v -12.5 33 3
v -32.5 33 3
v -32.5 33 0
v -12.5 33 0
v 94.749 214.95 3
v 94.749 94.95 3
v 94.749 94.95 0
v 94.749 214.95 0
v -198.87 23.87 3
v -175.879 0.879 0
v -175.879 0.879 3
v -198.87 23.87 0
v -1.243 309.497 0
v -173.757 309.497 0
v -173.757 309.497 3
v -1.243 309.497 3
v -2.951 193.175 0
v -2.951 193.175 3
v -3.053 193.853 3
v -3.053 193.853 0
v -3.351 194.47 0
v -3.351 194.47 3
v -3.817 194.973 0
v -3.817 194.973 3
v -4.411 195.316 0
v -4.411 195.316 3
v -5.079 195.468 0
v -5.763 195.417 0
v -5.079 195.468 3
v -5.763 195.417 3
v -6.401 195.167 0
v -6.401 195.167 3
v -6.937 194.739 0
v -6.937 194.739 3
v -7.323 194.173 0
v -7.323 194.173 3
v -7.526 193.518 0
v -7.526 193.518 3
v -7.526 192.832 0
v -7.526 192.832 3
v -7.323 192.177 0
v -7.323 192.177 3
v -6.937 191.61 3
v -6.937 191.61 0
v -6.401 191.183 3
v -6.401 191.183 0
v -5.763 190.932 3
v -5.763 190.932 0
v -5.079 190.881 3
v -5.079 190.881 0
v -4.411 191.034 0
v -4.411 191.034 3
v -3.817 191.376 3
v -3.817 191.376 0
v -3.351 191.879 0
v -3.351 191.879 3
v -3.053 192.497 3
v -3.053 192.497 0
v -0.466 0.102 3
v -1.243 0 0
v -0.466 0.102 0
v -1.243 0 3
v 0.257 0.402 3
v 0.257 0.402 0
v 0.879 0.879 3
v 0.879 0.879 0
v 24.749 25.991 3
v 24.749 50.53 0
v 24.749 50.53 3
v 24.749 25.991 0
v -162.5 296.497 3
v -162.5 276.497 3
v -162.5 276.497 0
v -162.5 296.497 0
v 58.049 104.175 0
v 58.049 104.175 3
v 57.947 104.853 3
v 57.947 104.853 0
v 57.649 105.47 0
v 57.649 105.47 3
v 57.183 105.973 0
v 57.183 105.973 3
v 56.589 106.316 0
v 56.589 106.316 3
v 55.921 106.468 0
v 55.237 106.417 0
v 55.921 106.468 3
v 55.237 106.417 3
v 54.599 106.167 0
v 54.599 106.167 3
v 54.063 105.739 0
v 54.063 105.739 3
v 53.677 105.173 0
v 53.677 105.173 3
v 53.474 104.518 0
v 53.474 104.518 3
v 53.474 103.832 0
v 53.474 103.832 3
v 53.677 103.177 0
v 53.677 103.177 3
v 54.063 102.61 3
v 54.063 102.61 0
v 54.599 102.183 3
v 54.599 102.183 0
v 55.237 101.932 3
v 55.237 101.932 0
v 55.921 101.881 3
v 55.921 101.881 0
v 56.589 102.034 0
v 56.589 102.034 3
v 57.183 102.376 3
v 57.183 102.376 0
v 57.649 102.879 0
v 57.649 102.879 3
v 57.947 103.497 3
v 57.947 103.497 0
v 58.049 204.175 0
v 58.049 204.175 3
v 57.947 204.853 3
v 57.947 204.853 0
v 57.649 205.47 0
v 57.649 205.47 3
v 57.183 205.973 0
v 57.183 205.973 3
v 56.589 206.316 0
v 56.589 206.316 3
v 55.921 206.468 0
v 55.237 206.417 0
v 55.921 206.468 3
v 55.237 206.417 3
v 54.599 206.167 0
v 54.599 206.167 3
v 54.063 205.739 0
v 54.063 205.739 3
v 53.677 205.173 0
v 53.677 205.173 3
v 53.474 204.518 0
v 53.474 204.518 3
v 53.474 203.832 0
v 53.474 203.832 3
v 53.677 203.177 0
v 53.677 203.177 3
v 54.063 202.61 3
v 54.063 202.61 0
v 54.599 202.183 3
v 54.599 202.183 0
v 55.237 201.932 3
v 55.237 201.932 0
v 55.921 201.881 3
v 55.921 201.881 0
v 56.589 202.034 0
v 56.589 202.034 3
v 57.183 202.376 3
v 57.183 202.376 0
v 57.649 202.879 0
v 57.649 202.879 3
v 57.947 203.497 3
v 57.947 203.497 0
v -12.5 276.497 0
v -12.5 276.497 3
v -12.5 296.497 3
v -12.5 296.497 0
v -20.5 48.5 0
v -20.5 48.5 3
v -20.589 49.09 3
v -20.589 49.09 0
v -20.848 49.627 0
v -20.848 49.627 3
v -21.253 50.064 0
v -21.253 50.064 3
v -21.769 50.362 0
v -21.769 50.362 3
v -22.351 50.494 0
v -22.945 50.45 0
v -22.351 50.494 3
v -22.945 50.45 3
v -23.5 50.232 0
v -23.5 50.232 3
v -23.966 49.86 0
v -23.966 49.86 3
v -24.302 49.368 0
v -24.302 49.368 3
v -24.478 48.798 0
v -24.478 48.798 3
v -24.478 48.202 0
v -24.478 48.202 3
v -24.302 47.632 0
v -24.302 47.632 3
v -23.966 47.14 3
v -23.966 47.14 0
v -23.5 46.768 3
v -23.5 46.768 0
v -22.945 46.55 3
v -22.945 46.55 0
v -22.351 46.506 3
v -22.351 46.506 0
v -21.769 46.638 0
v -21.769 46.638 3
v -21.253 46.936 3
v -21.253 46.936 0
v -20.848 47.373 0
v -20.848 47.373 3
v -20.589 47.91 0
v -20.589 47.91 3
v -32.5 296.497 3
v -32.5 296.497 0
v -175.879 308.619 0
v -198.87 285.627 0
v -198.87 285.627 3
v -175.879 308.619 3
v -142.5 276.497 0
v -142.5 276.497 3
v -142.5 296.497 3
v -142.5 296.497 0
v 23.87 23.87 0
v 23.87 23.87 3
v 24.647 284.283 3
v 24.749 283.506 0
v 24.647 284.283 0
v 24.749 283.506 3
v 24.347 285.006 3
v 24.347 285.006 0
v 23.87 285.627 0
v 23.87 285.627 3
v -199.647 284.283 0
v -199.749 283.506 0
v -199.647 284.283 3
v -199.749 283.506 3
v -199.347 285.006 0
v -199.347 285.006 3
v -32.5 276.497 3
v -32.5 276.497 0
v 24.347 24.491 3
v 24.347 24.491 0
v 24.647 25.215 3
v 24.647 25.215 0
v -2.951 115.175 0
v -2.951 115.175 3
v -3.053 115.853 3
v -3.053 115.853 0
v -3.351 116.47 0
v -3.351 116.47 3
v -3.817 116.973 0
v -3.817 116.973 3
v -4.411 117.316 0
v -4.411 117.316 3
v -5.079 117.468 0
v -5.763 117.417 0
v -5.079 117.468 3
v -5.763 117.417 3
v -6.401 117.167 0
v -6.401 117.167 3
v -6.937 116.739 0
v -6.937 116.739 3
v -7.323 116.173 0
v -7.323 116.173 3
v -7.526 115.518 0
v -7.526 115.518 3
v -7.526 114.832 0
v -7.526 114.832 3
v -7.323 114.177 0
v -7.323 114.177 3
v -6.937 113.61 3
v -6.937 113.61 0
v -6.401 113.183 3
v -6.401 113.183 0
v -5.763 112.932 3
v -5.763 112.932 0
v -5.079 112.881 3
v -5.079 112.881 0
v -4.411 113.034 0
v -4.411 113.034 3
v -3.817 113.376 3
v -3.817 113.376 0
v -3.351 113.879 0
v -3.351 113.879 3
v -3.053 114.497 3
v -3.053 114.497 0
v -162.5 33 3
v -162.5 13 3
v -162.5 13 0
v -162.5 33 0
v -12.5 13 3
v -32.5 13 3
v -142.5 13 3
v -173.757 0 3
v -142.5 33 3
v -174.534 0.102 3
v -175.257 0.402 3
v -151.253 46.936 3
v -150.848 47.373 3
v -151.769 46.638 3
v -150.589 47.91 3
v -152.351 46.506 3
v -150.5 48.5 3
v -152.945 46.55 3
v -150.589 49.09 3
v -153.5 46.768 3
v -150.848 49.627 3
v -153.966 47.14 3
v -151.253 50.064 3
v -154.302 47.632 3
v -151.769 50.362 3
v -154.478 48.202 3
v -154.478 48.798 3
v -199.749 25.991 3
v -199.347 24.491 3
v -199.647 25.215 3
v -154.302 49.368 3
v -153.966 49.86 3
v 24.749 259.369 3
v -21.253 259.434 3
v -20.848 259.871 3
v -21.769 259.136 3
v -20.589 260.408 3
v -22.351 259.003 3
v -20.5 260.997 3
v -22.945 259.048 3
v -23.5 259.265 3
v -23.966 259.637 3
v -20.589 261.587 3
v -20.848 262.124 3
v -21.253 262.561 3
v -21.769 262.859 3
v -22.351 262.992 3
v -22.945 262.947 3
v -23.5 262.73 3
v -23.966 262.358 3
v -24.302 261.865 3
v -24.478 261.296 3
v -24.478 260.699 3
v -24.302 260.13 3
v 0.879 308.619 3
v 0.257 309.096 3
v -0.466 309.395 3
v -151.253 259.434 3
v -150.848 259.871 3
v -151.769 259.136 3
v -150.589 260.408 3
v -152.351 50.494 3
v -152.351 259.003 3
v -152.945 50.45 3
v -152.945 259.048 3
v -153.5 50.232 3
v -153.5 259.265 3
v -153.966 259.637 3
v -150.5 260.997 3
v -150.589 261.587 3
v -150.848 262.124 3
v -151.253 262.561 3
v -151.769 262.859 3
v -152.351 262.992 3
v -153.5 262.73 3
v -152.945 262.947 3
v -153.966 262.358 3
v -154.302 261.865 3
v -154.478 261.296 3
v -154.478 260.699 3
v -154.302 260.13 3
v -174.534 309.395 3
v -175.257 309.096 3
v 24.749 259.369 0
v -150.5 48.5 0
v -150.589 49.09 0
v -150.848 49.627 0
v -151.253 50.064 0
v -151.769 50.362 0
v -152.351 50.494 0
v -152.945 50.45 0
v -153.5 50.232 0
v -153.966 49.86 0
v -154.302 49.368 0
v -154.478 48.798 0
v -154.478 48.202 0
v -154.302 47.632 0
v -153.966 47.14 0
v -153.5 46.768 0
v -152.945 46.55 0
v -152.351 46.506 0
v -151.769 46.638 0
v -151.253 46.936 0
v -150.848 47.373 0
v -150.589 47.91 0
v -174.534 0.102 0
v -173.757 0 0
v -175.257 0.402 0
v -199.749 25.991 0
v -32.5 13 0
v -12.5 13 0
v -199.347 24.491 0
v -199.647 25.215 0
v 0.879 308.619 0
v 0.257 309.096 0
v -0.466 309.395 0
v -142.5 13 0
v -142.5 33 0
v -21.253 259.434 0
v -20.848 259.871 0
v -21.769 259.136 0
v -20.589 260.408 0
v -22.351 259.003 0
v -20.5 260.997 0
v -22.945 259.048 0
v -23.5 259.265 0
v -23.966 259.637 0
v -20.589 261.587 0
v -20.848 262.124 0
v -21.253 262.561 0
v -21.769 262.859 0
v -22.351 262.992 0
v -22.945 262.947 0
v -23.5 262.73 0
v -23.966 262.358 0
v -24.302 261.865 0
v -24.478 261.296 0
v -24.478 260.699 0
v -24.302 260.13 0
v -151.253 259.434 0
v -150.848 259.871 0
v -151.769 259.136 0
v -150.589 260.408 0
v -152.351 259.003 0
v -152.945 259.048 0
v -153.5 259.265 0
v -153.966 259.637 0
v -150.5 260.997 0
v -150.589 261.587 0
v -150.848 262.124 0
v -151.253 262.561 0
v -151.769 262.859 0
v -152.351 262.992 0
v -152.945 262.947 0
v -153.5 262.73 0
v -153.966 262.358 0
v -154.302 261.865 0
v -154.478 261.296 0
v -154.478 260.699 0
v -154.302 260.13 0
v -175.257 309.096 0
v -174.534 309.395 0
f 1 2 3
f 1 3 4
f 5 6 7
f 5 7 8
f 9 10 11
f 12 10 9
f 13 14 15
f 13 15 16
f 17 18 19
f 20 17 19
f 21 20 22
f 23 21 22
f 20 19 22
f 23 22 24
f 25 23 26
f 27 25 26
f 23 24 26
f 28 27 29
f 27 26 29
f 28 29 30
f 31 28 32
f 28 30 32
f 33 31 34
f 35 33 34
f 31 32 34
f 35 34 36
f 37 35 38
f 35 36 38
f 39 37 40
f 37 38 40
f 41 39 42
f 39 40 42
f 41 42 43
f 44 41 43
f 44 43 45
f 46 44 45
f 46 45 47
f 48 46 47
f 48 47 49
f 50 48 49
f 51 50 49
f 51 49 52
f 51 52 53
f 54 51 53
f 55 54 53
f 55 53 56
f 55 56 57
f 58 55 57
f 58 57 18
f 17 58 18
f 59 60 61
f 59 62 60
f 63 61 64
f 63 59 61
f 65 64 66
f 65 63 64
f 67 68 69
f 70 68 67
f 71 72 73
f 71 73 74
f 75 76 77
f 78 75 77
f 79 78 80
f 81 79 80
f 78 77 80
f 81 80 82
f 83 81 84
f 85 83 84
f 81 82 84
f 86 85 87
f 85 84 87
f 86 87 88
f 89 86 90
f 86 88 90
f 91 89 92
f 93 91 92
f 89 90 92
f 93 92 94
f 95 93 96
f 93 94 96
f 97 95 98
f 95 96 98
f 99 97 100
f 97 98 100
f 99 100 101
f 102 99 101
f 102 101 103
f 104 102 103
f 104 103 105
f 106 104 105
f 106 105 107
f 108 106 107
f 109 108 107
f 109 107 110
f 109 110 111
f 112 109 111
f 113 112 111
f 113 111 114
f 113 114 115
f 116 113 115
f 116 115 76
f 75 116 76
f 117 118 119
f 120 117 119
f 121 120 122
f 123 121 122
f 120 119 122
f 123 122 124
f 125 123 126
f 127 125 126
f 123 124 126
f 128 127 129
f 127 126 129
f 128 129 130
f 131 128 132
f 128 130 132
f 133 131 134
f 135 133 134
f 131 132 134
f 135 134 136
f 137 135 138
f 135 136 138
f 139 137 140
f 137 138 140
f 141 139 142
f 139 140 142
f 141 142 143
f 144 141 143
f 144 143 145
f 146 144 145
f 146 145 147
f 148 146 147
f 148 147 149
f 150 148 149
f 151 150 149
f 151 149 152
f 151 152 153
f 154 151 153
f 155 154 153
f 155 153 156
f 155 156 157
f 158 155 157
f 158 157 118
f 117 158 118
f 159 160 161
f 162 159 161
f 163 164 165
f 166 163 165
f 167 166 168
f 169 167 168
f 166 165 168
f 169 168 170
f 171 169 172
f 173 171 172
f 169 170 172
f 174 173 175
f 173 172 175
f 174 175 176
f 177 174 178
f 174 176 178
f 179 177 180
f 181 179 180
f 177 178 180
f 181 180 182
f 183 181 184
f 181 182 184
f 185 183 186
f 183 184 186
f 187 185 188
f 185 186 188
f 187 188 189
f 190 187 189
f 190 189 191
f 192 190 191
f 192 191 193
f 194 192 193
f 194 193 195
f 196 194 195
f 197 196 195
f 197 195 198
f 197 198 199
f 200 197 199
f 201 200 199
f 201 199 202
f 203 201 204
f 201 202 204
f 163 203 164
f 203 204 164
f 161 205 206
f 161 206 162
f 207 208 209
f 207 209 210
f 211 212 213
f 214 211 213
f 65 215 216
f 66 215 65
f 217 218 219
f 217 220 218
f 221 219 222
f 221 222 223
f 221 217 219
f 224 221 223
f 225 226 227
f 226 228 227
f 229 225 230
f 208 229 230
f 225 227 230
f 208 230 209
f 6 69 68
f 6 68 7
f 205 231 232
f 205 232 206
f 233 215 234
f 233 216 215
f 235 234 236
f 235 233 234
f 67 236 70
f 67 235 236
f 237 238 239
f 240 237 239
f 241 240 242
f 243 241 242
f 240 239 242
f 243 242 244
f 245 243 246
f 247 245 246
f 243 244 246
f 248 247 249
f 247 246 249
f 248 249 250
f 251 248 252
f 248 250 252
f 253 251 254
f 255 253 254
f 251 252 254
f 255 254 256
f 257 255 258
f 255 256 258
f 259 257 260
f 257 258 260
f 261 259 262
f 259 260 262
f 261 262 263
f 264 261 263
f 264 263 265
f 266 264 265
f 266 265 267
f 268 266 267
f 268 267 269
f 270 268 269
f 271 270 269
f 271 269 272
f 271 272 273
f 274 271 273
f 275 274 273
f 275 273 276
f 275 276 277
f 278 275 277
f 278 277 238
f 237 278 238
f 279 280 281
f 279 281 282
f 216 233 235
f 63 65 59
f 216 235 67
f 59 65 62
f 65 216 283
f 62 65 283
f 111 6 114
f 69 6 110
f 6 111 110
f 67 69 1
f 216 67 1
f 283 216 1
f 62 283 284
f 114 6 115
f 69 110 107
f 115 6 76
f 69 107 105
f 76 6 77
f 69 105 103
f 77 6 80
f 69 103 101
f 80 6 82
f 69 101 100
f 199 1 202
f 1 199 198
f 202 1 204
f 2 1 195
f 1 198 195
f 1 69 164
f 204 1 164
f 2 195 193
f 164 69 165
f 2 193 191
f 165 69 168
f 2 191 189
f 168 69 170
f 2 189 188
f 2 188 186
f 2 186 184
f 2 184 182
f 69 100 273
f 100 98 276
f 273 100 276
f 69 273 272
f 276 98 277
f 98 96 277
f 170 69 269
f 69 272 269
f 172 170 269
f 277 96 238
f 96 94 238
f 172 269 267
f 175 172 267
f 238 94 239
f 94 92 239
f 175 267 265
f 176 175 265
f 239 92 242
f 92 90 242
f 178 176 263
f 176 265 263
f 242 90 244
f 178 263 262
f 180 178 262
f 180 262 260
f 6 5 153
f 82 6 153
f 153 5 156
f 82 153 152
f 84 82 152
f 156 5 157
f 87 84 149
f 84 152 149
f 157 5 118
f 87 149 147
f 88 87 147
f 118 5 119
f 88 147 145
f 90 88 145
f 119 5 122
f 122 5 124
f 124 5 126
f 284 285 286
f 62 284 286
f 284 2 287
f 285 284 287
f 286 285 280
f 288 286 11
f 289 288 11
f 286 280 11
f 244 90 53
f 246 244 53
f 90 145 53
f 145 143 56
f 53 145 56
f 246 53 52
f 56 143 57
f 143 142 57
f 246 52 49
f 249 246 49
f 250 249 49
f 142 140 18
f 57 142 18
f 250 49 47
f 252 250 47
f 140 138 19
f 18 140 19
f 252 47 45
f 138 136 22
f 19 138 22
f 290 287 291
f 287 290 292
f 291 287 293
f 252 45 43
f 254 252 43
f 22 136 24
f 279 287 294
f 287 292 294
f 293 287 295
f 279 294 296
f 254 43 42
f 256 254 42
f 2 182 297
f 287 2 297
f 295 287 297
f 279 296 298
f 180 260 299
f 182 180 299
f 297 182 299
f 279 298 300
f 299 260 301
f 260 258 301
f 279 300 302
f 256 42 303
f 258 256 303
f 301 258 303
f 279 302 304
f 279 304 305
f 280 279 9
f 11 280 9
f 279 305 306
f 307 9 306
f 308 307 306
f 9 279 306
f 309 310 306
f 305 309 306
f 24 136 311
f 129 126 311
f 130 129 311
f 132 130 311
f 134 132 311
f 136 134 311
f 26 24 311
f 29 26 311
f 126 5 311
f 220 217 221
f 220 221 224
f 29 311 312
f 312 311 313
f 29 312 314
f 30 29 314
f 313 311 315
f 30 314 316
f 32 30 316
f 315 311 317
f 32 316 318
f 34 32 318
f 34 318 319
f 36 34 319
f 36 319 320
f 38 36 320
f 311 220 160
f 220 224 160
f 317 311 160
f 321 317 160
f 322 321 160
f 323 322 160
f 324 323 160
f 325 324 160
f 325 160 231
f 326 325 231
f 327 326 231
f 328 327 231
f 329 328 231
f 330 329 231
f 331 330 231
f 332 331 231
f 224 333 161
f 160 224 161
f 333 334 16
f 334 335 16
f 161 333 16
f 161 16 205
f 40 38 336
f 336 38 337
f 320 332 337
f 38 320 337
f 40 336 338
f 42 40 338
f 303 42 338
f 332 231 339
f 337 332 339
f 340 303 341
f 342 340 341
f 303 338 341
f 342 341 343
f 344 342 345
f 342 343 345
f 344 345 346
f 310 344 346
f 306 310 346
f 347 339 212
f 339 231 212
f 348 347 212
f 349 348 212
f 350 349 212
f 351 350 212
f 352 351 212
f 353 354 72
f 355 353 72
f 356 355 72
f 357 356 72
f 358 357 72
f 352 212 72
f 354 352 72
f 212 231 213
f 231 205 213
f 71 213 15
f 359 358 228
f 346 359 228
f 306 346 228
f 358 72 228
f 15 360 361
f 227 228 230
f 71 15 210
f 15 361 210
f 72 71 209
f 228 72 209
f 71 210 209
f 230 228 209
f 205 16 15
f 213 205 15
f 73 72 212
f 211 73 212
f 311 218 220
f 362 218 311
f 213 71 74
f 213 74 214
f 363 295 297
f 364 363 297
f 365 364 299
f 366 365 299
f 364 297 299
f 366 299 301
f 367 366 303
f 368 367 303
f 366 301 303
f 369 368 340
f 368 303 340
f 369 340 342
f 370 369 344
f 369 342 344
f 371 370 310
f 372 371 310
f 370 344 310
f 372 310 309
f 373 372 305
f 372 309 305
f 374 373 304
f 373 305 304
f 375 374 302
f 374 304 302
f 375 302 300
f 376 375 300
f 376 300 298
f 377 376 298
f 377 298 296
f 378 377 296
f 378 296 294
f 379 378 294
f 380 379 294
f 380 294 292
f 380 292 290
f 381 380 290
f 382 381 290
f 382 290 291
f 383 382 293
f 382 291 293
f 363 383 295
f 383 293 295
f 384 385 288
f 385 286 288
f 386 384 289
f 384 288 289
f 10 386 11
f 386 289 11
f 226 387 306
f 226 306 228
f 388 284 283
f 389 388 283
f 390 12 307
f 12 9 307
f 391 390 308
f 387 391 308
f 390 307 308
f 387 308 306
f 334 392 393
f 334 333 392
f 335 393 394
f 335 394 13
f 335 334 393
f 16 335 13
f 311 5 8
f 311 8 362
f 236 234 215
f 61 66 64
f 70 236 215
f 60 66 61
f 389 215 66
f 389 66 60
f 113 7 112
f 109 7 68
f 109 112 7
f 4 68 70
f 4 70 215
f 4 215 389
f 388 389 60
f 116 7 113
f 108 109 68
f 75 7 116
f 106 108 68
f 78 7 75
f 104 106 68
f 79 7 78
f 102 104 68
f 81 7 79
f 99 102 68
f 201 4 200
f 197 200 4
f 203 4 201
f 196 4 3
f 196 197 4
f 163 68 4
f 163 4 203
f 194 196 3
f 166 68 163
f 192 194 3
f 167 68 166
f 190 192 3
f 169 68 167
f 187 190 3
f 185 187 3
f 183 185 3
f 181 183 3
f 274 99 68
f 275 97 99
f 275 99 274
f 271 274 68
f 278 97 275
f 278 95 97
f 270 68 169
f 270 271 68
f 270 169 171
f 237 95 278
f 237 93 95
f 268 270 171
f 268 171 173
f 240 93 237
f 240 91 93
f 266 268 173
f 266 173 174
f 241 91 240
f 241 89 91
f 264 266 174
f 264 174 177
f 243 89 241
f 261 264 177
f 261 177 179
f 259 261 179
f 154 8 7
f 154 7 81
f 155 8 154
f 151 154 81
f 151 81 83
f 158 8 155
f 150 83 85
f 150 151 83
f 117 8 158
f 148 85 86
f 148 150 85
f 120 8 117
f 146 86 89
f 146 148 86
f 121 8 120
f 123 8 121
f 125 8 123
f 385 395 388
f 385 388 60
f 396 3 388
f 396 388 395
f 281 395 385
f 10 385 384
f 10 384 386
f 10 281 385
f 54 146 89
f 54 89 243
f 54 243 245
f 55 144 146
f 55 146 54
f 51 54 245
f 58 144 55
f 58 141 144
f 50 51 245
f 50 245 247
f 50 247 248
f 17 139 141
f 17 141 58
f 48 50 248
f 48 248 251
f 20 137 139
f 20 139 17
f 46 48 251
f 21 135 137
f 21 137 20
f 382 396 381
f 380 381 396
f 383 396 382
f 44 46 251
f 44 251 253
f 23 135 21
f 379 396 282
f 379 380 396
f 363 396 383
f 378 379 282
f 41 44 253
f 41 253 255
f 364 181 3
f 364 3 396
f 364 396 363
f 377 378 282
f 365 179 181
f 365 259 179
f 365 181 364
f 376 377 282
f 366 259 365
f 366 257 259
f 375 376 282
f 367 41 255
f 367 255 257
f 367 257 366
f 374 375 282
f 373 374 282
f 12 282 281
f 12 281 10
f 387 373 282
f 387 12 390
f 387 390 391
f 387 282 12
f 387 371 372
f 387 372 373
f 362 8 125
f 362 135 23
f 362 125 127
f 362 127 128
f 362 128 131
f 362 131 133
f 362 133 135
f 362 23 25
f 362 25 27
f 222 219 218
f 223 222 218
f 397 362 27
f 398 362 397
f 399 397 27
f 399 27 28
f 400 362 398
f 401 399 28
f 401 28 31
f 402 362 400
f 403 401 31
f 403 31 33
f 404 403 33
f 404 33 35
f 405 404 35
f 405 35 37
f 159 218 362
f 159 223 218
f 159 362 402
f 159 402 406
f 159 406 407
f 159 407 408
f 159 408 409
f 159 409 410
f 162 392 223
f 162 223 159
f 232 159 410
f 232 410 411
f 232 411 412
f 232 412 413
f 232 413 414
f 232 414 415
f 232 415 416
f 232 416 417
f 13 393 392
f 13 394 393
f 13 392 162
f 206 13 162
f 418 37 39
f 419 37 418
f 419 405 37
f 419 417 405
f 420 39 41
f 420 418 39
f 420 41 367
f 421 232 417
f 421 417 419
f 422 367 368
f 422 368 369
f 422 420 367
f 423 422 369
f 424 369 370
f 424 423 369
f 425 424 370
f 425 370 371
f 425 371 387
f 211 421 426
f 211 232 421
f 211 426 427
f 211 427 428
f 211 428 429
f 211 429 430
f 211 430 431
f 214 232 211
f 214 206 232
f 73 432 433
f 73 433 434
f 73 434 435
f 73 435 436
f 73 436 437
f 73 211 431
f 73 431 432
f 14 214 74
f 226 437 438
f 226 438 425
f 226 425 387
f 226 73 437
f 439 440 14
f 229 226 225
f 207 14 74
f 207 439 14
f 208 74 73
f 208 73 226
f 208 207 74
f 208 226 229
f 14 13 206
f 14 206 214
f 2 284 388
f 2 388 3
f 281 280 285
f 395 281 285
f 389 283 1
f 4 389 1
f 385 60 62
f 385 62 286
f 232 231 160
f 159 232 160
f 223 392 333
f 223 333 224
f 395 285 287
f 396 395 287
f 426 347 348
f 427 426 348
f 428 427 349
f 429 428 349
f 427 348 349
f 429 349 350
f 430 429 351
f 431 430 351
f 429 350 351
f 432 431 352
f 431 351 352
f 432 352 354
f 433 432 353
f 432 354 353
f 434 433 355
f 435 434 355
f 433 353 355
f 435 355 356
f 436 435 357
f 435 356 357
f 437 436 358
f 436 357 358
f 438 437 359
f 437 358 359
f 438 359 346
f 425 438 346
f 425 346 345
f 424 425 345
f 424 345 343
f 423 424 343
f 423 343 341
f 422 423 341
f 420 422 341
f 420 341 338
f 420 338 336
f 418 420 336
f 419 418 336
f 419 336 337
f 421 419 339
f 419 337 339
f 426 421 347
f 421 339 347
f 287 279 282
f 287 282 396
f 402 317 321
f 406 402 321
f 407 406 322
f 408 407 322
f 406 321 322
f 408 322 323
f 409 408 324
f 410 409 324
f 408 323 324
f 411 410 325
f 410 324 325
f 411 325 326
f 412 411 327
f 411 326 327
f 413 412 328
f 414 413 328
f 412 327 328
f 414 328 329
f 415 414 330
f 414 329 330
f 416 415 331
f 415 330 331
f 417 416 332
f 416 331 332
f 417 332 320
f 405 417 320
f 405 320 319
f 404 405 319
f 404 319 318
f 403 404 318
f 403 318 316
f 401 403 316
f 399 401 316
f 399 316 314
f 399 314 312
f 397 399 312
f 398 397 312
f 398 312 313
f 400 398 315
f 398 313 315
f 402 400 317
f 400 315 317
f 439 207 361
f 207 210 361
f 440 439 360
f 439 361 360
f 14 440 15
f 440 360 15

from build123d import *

# Parameters (mm, degrees)
BASE_DEPTH              = 3
ESQUISSE2_W             = 20
ESQUISSE2_H             = 20
ENL_V_MAT_EXTRU_1_DEPTH = 4
ESQUISSE4_R             = 2
ENL_V_MAT_EXTRU_4_DEPTH = 3
CONG_1_R                = 3
BOSS_EXTRU_2_DEPTH      = 3
ESQUISSE3_R             = 2.3
TROUS_LIDAR_DEPTH       = 10


with BuildPart() as part:
    # Esquisse1 → Base (new body)
    with BuildSketch(Plane.XY):
        Polygon((0, 0), (-175, 0), (-199.748737342, 24.748737342), (-199.748737342, 284.748737342), (-175, 309.497474683), (0, 309.497474683), (24.748737342, 284.748737342), (24.748737342, 24.748737342), align=None)
    extrude(amount=BASE_DEPTH)

    # Esquisse2 → Enlèv. mat.-Extru.1 (cut, through all)
    with BuildSketch(Plane.XY.offset(3)):
        with Locations((-152.5, 286.497474683)):
            Rectangle(ESQUISSE2_W, ESQUISSE2_H)
        with Locations((-152.5, 23)):
            Rectangle(ESQUISSE2_W, ESQUISSE2_H)
        with Locations((-22.5, 23)):
            Rectangle(ESQUISSE2_W, ESQUISSE2_H)
        with Locations((-22.5, 286.497474683)):
            Rectangle(ESQUISSE2_W, ESQUISSE2_H)
    extrude(amount=-ENL_V_MAT_EXTRU_1_DEPTH, mode=Mode.SUBTRACT)

    # Esquisse4 → Enlèv. mat.-Extru.4 (cut)
    with BuildSketch(Plane.XY.offset(3)):
        with Locations((-152.5, 260.997474683)):
            Circle(ESQUISSE4_R)
        with Locations((-152.5, 48.5)):
            Circle(ESQUISSE4_R)
        with Locations((-22.5, 260.997474683)):
            Circle(ESQUISSE4_R)
        with Locations((-22.5, 48.5)):
            Circle(ESQUISSE4_R)
    extrude(amount=-ENL_V_MAT_EXTRU_4_DEPTH, mode=Mode.SUBTRACT)

    # Congé1
    cong_1_edges = [part.edges().sort_by_distance(p)[0] for p in [
        (0, 0, 1.5),
        (-175, 0, 1.5),
        (-199.748737342, 24.748737342, 1.5),
        (-199.748737342, 284.748737342, 1.5),
        (-175, 309.497474683, 1.5),
        (0, 309.497474683, 1.5),
        (24.748737342, 284.748737342, 1.5),
        (24.748737342, 24.748737342, 1.5),
    ]]
    fillet(cong_1_edges, radius=CONG_1_R)

    # Esquisse6 → Boss.-Extru.2 (add)
    with BuildSketch(Plane.XY.offset(3)):
        Polygon((24.748737342, 214.949513542), (24.748737342, 94.547961141), (24.748737342, 50.529955402), (94.748737342, 94.949513542), (94.748737342, 214.949513542), (24.748737342, 259.369071682), align=None)
    extrude(amount=-BOSS_EXTRU_2_DEPTH)

    # Esquisse3 → trous lidar (cut)
    with BuildSketch(Plane.XY.offset(3)):
        with Locations((-5.251262658, 193.174712193)):
            Circle(ESQUISSE3_R)
        with Locations((55.748737342, 204.174712193)):
            Circle(ESQUISSE3_R)
        with Locations((-5.251262658, 115.174712193)):
            Circle(ESQUISSE3_R)
        with Locations((55.748737342, 104.174712193)):
            Circle(ESQUISSE3_R)
    extrude(amount=-TROUS_LIDAR_DEPTH, mode=Mode.SUBTRACT)


solid = part.part
